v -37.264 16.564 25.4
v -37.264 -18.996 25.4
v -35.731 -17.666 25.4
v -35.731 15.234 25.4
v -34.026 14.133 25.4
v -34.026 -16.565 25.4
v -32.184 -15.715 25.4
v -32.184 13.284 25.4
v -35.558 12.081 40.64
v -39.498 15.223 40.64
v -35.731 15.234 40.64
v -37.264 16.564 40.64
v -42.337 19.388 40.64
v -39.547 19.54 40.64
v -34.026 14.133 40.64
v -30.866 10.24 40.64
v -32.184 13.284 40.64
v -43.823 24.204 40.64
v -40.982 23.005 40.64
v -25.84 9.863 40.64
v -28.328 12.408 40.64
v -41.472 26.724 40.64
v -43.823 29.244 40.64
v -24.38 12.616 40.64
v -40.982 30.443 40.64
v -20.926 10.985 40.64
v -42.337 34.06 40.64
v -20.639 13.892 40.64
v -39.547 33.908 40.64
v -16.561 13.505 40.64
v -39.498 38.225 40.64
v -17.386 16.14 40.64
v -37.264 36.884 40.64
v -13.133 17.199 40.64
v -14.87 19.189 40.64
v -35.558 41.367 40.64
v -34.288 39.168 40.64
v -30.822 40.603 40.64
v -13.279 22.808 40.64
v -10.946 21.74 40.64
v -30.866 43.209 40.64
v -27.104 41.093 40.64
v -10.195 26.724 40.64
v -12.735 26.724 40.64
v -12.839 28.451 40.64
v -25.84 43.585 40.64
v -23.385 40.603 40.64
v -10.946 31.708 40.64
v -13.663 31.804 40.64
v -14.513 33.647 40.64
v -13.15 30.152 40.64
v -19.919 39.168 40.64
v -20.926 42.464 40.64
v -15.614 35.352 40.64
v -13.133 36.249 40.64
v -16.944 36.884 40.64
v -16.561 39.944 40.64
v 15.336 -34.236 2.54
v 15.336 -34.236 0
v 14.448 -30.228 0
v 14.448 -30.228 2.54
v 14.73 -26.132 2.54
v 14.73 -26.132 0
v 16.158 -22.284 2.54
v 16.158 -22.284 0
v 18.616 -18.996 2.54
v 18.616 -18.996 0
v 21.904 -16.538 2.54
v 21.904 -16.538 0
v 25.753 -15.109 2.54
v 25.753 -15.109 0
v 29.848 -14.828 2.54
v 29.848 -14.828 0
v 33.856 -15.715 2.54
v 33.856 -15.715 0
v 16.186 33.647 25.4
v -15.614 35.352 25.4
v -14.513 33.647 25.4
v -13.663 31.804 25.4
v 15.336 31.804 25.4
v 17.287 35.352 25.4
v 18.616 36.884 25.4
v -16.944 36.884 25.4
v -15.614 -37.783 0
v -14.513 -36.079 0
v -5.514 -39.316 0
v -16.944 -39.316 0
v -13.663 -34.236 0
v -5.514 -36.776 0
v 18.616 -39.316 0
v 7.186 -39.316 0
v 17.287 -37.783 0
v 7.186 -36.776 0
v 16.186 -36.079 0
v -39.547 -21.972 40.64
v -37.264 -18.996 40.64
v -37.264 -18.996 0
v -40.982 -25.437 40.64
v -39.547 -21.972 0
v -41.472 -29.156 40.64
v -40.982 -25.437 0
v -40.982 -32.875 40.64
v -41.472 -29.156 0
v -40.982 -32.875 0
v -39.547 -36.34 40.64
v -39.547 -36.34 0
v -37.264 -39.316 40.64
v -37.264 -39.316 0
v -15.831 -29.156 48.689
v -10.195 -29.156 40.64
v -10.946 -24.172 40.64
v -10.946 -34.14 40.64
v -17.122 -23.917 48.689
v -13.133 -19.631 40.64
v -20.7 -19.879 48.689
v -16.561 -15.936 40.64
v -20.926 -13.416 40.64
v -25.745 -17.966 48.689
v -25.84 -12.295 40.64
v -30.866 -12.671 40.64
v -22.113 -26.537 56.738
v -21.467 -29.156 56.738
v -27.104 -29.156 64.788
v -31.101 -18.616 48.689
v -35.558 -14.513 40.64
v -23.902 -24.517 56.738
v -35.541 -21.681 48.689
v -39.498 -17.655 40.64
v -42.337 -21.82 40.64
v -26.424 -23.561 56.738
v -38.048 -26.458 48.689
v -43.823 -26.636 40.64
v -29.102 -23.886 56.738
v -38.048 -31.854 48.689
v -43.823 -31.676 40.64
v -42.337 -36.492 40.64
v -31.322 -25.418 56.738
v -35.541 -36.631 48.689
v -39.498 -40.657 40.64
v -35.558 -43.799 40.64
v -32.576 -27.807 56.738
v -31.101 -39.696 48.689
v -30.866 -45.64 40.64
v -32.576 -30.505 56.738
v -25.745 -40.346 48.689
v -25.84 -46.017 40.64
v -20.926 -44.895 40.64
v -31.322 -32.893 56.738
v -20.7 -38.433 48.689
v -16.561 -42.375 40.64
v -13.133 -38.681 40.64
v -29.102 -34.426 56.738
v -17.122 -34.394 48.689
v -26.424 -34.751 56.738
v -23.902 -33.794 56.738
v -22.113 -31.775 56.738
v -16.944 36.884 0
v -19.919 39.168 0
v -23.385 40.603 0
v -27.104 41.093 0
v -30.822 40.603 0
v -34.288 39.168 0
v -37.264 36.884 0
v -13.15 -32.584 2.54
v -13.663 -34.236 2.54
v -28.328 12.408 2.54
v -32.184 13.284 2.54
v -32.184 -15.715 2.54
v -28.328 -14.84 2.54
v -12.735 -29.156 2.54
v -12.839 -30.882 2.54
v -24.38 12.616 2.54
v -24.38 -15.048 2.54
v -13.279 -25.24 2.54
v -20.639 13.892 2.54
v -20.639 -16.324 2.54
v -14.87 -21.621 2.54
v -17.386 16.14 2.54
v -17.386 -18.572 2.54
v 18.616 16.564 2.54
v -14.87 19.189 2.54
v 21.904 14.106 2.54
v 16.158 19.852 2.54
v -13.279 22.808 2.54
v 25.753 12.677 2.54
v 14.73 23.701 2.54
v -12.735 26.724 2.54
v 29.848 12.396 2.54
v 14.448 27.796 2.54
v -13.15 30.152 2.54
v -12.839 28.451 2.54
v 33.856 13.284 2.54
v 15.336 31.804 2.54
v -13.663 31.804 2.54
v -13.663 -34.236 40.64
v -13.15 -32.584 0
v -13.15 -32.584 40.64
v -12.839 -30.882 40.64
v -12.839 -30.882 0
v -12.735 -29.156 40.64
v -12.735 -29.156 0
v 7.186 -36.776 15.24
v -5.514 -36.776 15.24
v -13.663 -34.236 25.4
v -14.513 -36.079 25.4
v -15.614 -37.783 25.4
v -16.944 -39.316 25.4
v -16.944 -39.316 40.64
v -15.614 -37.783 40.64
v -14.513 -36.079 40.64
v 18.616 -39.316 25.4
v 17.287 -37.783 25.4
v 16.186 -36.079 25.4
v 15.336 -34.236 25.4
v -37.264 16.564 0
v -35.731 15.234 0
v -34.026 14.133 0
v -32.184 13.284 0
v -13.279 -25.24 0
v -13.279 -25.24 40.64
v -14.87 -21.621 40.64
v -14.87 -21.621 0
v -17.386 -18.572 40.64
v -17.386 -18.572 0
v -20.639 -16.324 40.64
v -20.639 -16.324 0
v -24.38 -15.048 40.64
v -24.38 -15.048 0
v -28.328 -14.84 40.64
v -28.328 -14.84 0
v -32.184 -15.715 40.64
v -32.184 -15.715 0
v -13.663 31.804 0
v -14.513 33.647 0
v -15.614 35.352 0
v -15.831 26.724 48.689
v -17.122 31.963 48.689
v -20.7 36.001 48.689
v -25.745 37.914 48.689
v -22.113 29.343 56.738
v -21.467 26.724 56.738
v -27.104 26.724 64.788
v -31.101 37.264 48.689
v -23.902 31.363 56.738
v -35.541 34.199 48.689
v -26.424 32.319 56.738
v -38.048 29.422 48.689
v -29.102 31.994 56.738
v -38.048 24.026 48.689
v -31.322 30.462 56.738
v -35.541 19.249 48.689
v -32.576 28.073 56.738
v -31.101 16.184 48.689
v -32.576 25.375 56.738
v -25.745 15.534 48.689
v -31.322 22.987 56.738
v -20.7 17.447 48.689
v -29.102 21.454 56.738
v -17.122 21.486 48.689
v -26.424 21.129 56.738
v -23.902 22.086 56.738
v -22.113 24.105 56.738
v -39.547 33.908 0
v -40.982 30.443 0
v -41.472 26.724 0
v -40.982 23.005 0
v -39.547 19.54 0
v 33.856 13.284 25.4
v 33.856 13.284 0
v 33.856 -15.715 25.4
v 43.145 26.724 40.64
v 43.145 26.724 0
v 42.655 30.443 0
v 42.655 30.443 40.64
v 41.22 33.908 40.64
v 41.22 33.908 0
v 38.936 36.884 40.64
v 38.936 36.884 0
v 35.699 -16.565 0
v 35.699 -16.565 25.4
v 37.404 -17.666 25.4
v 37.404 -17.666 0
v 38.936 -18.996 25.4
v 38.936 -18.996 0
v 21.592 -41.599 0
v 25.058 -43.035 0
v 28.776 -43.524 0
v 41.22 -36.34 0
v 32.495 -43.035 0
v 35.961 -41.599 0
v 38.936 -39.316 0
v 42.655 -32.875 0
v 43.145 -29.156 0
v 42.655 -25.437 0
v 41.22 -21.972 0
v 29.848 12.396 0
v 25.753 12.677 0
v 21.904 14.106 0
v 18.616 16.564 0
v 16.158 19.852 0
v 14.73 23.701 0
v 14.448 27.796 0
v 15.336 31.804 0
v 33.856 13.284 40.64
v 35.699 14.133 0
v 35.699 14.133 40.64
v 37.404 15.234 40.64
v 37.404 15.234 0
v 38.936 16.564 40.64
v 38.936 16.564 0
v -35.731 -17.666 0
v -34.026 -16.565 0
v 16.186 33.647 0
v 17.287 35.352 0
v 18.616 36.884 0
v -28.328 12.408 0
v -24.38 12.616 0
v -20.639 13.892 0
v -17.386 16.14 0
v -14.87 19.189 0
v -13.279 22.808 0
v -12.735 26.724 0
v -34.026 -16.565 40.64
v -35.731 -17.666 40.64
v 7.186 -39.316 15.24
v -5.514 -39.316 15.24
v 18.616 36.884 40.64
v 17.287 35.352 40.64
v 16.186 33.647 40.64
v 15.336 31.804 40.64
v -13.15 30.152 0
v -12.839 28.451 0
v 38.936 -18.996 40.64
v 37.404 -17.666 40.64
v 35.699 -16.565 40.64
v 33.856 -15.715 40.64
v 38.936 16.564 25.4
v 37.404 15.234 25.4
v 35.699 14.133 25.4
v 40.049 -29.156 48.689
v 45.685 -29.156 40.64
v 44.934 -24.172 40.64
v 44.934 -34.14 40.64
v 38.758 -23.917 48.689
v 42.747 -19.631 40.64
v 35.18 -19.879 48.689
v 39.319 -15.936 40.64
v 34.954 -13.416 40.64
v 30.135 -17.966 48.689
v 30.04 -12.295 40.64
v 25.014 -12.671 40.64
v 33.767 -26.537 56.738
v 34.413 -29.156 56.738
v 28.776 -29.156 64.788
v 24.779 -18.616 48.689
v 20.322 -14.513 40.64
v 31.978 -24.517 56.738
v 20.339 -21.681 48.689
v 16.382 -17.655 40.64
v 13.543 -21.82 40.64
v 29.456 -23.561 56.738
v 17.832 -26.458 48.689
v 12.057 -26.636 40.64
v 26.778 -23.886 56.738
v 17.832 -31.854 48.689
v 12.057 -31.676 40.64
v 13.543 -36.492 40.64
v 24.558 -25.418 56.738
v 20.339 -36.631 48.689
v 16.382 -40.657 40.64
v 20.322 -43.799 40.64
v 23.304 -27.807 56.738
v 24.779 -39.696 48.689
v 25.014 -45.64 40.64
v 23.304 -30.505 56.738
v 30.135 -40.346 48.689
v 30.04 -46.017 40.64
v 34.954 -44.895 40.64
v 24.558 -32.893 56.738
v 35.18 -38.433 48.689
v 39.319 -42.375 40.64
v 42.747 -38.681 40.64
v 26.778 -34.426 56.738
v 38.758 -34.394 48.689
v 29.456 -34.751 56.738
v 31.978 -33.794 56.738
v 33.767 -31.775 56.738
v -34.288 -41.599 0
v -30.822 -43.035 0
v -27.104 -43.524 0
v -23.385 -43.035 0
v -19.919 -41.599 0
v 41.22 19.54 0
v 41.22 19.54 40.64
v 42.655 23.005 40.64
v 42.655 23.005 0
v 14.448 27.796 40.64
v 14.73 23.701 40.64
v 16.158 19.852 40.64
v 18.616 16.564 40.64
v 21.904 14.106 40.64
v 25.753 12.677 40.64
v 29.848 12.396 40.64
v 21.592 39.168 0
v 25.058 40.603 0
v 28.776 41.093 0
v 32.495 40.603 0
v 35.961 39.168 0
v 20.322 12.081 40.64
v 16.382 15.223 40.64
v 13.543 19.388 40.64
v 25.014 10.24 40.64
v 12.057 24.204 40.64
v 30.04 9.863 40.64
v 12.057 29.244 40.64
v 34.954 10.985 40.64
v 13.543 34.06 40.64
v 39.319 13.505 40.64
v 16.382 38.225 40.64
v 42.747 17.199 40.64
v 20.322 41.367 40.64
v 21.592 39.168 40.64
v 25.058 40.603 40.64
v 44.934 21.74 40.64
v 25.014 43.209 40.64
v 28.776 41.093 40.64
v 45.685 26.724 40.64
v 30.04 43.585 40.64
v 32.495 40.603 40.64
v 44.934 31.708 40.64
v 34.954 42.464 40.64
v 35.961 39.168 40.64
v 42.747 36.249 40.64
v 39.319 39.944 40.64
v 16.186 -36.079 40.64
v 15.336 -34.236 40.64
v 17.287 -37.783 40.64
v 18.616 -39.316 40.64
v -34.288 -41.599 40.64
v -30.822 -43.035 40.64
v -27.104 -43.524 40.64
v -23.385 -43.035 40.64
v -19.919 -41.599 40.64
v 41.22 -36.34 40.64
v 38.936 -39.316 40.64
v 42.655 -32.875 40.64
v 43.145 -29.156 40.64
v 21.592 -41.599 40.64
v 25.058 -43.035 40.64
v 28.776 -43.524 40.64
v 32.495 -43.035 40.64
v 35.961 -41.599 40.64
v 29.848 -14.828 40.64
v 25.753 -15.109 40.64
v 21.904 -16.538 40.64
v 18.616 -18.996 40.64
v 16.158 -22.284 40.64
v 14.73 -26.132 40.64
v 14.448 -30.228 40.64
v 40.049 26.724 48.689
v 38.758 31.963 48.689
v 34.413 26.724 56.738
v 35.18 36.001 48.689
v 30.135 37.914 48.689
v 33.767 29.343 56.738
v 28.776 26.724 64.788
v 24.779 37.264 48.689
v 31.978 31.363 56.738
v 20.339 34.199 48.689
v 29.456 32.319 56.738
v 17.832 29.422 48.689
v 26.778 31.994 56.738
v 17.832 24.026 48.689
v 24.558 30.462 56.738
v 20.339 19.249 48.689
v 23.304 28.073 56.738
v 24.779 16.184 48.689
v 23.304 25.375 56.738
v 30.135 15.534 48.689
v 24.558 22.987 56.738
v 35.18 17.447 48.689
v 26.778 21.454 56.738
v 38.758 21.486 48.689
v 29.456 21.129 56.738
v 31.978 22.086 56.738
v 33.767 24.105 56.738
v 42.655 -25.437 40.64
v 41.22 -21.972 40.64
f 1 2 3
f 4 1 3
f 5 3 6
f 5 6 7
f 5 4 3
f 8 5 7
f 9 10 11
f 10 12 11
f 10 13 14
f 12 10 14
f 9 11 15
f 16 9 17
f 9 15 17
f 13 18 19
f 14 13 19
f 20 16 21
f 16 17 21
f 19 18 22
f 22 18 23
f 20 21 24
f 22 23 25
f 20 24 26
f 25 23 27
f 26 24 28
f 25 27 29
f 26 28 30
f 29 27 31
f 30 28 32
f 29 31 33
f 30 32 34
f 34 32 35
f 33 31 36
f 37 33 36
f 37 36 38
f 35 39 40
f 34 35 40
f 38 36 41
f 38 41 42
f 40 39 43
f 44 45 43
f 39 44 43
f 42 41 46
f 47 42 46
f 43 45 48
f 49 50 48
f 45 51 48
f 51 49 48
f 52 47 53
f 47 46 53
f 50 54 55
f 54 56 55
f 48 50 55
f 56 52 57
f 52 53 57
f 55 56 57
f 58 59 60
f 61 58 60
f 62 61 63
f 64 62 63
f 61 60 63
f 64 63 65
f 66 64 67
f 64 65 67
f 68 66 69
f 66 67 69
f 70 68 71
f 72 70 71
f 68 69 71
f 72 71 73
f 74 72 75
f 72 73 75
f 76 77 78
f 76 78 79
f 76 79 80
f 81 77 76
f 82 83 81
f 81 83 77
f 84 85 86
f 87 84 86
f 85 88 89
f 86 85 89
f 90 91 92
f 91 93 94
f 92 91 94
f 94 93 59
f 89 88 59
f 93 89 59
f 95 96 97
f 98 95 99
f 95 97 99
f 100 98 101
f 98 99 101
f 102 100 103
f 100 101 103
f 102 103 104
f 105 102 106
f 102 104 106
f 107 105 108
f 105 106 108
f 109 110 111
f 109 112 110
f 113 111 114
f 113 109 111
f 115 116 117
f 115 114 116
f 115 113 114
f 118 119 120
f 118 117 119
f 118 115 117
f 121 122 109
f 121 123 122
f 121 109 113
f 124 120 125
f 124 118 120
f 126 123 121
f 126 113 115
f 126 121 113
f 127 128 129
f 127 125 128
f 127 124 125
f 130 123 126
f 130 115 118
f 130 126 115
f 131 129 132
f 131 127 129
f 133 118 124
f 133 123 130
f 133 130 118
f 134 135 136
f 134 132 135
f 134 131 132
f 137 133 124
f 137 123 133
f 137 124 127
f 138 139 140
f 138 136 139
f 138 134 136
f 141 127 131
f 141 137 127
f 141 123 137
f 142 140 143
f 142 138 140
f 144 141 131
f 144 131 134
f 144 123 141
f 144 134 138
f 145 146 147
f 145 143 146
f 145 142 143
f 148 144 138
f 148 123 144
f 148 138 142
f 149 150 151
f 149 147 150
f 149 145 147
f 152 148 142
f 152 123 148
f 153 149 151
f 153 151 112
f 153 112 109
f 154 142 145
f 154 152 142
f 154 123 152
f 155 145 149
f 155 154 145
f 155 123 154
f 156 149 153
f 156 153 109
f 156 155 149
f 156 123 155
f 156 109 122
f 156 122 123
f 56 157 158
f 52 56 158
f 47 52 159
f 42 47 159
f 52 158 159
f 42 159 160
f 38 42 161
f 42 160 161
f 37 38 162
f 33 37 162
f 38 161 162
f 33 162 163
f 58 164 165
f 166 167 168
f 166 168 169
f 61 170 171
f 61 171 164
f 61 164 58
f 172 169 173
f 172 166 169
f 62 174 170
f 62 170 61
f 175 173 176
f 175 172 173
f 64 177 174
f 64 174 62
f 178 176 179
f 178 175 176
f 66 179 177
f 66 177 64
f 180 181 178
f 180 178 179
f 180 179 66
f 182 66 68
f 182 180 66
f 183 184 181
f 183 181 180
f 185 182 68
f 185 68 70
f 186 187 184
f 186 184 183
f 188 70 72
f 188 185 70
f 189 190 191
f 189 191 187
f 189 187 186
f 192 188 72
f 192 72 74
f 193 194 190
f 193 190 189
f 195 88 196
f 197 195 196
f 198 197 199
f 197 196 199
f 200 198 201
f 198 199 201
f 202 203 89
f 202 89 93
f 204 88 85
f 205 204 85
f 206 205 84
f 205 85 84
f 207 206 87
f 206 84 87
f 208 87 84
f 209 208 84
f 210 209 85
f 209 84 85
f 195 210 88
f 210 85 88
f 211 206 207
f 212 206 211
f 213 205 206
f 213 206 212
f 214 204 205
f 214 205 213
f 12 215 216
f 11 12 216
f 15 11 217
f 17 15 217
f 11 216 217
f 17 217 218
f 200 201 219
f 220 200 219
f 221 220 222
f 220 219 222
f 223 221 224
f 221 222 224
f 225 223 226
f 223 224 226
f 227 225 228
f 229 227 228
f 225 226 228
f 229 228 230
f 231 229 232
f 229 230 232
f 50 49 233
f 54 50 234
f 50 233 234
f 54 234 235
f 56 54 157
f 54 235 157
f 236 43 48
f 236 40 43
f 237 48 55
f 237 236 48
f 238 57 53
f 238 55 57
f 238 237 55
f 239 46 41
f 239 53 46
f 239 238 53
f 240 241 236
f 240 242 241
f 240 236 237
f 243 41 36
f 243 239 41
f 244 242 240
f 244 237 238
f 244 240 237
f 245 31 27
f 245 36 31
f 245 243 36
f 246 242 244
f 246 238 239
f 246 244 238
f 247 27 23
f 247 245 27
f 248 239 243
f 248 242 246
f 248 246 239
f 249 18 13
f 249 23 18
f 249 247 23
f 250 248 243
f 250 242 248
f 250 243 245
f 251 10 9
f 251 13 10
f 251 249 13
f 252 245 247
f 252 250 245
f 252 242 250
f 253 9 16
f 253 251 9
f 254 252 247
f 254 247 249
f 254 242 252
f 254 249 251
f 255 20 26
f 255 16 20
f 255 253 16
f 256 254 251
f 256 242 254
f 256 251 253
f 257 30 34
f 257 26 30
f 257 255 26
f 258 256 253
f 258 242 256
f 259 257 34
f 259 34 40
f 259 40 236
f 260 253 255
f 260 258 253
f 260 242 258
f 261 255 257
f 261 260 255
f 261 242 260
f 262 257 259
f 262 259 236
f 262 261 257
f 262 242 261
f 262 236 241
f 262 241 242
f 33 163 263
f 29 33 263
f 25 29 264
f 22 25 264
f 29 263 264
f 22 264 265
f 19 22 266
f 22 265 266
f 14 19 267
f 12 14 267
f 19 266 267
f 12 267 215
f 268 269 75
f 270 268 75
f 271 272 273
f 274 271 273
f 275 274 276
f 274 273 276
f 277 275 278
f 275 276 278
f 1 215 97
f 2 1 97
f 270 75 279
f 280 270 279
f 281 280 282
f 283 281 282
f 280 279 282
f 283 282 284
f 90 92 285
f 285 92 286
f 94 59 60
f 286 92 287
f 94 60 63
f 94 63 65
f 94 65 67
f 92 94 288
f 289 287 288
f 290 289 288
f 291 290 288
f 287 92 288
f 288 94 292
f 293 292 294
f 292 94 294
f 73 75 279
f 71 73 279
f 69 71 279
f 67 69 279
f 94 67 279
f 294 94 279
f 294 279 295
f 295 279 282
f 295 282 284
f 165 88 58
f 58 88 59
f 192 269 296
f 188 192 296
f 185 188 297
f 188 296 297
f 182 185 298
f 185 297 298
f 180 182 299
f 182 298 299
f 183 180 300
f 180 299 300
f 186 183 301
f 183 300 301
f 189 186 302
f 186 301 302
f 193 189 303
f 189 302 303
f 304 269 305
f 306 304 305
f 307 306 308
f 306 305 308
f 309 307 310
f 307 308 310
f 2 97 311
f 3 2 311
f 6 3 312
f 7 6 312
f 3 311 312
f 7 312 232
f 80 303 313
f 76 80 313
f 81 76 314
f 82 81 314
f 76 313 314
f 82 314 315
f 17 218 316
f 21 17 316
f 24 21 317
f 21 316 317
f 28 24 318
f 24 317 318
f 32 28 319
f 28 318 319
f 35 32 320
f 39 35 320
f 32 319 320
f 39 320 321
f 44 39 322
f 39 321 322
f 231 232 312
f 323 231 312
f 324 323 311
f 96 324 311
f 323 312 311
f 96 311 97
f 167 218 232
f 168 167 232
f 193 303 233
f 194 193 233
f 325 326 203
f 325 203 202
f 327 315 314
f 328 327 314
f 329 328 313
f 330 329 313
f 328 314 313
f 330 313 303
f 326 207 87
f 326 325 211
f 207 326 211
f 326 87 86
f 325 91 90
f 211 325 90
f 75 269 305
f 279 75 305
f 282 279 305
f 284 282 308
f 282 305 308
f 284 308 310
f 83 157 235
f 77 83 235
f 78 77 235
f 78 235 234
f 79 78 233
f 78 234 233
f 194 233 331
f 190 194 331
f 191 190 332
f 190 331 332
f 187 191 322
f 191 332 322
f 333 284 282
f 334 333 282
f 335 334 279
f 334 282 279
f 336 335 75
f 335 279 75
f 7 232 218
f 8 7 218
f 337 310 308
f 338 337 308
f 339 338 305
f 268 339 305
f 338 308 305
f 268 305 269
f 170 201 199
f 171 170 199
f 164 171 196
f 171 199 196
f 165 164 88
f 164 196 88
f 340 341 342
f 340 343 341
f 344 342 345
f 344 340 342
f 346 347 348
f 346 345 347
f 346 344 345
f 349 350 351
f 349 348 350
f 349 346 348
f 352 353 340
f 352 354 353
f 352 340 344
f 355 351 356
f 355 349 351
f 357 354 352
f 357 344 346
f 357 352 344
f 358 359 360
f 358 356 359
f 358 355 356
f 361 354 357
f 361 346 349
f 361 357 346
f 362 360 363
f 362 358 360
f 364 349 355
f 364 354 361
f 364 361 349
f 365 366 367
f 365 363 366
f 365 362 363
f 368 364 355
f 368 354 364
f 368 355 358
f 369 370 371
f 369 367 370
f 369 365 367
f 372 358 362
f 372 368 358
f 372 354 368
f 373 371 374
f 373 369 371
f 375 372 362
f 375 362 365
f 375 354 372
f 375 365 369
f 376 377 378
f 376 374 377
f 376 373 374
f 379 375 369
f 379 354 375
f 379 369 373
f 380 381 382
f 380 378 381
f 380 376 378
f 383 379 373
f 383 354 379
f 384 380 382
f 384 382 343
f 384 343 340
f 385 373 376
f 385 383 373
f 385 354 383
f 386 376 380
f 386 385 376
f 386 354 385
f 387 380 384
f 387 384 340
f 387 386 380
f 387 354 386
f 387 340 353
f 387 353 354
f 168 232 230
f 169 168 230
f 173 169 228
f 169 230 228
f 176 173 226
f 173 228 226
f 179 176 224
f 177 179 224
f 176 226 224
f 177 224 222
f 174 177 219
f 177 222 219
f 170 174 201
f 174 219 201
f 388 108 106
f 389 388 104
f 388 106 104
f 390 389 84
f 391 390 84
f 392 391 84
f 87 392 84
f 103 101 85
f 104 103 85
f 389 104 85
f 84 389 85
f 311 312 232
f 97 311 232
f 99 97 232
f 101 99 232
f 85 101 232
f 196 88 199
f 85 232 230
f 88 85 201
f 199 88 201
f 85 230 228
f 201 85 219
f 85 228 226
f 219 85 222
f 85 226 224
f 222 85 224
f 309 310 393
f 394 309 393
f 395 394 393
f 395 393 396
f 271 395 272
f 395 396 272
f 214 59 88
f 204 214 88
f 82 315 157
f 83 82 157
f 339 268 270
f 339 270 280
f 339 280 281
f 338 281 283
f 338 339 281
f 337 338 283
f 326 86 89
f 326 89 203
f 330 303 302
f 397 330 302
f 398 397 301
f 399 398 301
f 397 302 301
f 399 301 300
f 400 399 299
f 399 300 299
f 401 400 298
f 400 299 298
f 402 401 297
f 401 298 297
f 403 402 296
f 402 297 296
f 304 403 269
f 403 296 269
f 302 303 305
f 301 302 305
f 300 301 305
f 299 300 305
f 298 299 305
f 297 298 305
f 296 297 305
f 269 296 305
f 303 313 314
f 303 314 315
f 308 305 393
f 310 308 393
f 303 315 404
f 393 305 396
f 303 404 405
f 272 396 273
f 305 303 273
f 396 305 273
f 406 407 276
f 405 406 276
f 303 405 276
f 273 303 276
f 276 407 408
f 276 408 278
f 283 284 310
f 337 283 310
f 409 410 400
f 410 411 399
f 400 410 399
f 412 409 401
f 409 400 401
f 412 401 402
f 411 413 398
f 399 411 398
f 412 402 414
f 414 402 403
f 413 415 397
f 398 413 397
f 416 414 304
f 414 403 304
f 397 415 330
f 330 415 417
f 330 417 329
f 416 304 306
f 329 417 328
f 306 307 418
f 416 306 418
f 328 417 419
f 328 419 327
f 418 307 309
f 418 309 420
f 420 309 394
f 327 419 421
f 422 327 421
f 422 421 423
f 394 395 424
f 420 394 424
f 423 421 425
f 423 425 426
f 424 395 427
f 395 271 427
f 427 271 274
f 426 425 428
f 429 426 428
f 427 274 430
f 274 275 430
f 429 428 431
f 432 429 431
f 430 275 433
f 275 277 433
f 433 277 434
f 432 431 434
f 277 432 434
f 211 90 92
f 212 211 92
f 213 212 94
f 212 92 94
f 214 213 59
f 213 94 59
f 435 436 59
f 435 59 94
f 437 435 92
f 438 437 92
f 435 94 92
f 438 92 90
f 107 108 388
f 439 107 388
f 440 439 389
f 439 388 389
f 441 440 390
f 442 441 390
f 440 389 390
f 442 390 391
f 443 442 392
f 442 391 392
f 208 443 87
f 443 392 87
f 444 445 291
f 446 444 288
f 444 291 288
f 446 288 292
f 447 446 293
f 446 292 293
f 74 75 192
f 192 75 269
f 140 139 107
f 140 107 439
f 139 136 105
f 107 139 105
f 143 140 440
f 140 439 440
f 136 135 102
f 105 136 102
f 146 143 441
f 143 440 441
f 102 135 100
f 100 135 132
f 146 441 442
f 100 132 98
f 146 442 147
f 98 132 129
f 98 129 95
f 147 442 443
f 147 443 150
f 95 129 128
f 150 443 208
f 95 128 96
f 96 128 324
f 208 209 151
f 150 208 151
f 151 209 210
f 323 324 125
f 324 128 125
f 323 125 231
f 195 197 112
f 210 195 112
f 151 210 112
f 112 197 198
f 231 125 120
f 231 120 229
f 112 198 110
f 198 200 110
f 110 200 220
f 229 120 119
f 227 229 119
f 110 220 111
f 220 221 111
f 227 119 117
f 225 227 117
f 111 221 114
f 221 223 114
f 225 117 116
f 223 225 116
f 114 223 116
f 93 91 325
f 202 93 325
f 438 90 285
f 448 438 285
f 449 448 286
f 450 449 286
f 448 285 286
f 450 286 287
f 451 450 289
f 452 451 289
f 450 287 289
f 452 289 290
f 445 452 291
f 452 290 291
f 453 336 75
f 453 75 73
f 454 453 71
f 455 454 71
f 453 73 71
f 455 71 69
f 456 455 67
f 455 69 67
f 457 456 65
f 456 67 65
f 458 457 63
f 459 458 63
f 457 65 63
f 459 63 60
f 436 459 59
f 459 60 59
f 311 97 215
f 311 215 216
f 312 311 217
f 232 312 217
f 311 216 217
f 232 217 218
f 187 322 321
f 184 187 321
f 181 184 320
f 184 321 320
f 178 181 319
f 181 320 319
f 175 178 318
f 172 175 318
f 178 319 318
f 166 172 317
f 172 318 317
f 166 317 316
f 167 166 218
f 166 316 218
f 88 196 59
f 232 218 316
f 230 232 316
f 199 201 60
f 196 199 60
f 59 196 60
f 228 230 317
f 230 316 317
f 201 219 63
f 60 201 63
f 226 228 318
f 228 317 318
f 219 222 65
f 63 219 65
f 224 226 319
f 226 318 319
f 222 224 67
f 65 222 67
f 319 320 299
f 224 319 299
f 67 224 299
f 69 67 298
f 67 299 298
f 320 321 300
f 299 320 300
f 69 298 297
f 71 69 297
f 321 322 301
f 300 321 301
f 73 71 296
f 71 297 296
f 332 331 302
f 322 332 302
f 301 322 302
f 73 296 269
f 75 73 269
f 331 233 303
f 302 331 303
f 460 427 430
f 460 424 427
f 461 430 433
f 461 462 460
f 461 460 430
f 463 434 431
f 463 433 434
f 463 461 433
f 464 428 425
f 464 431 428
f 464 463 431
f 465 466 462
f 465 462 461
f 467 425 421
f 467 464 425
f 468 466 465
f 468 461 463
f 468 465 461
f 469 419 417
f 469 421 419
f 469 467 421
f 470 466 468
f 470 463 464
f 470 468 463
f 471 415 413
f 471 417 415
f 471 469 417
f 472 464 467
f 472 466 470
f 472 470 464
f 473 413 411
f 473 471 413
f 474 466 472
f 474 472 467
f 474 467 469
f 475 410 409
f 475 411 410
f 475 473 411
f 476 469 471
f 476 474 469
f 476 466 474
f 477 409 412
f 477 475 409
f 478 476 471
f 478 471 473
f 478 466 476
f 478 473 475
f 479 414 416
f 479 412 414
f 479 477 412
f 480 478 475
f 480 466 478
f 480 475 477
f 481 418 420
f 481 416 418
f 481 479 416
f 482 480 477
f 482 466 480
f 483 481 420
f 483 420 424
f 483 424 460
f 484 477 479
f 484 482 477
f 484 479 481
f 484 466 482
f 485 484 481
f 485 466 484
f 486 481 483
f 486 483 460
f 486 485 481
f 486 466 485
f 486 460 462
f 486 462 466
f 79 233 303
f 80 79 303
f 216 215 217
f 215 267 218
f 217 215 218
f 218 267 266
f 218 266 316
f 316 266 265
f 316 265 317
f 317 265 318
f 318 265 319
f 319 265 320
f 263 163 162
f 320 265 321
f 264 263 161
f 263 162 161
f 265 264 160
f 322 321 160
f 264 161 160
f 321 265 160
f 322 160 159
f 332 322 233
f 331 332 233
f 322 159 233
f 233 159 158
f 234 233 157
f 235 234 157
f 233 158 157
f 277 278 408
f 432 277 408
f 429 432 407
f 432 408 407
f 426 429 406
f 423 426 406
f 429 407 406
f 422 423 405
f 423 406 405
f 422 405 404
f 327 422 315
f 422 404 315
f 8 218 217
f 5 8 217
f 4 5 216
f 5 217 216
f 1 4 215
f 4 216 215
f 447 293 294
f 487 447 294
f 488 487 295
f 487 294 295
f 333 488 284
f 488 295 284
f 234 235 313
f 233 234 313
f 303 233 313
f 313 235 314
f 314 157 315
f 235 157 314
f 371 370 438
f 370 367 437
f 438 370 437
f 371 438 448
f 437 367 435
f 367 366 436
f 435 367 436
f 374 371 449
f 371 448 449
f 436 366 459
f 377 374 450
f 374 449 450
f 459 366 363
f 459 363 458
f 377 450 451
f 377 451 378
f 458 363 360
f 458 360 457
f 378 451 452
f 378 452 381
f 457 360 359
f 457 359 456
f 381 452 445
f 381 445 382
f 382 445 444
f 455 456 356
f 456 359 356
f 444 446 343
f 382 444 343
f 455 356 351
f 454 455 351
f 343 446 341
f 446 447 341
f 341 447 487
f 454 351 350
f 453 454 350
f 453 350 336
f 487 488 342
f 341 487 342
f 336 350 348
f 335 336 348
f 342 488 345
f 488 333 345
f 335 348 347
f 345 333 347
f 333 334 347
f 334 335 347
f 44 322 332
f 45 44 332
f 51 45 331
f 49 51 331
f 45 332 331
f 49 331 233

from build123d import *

# Parameters (mm, degrees)
F1_DEPTH  = 2.54
F2_DEPTH  = 25.4
F3_DEPTH  = 40.64
F4_R      = 16.9084097937
F5_DEPTH  = 25.4
F5_TAPER  = 35
F6_R      = 16.9084097937
F7_DEPTH  = 25.4
F7_TAPER  = 35
F8_R      = 16.9084097937
F9_DEPTH  = 25.4
F9_TAPER  = 35
F10_R     = 16.9084097937
F11_DEPTH = 25.4
F11_TAPER = 35
F12_W     = 12.7
F12_H     = 15.24
F13_DEPTH = 2.54


with BuildPart() as f1:
    # F0 (on Top) → F1 (new body)
    with BuildSketch(Plane.XY):
        with BuildLine():
            Line((15.3360397668, 31.8040953928), (-13.6631269128, 31.8040953928))
            ThreePointArc((-13.6631269128, 31.8040953928), (-12.969035899, 29.3061280832), (-12.7351337793, 26.7240953928))
            ThreePointArc((-12.7351337793, 26.7240953928), (-18.9347101726, 14.9037163432), (-32.183543573, 13.2836787326))
            Line((-32.183543573, 13.2836787326), (-32.183543573, -15.715487947))
            ThreePointArc((-32.183543573, -15.715487947), (-18.9347101726, -17.3355255576), (-12.7351337793, -29.1559046072))
            ThreePointArc((-12.7351337793, -29.1559046072), (-12.969035899, -31.7379372975), (-13.6631269128, -34.2359046072))
            Line((-13.6631269128, -34.2359046072), (15.3360397668, -34.2359046072))
            ThreePointArc((15.3360397668, -34.2359046072), (18.616456427, -18.9959046072), (33.856456427, -15.715487947))
            Line((33.856456427, -15.715487947), (33.856456427, 13.2836787326))
            ThreePointArc((33.856456427, 13.2836787326), (18.616456427, 16.5640953928), (15.3360397668, 31.8040953928))
        make_face()
    extrude(amount=F1_DEPTH)


with BuildPart() as f2:
    # F0 (on Top) → F2 (new body)
    with BuildSketch(Plane.XY):
        with BuildLine():
            Line((38.936456427, -18.9959046072), (38.936456427, 16.5640953928))
            ThreePointArc((38.936456427, 16.5640953928), (36.5709854933, 14.6536141831), (33.856456427, 13.2836787326))
            Line((33.856456427, 13.2836787326), (33.856456427, -15.715487947))
            ThreePointArc((33.856456427, -15.715487947), (36.5709854933, -17.0854233975), (38.936456427, -18.9959046072))
        make_face()
    extrude(amount=F2_DEPTH)


with BuildPart() as f2b:
    # F0 (on Top) → F2, piece 2 (new body)
    with BuildSketch(Plane.XY):
        with BuildLine():
            ThreePointArc((-13.6631269128, -34.2359046072), (-15.0330623633, -36.9504336735), (-16.943543573, -39.3159046072))
            Line((-16.943543573, -39.3159046072), (18.616456427, -39.3159046072))
            ThreePointArc((18.616456427, -39.3159046072), (16.7059752173, -36.9504336735), (15.3360397668, -34.2359046072))
            Line((15.3360397668, -34.2359046072), (-13.6631269128, -34.2359046072))
        make_face()
    extrude(amount=F2_DEPTH)

    # F12 (on face) → F13 (cut)
    with BuildSketch(Plane.XZ.offset(39.3159046072)):
        with Locations((0.836456427, 7.62)):
            Rectangle(F12_W, F12_H)
    extrude(amount=-F13_DEPTH, mode=Mode.SUBTRACT)


with BuildPart() as f2c:
    # F0 (on Top) → F2, piece 3 (new body)
    with BuildSketch(Plane.XY):
        with BuildLine():
            ThreePointArc((-32.183543573, 13.2836787326), (-34.8980726394, 14.6536141831), (-37.263543573, 16.5640953928))
            Line((-37.263543573, 16.5640953928), (-37.263543573, -18.9959046072))
            ThreePointArc((-37.263543573, -18.9959046072), (-34.8980726394, -17.0854233975), (-32.183543573, -15.715487947))
            Line((-32.183543573, -15.715487947), (-32.183543573, 13.2836787326))
        make_face()
    extrude(amount=F2_DEPTH)


with BuildPart() as f2d:
    # F0 (on Top) → F2, piece 4 (new body)
    with BuildSketch(Plane.XY):
        with BuildLine():
            Line((18.616456427, 36.8840953928), (-16.943543573, 36.8840953928))
            ThreePointArc((-16.943543573, 36.8840953928), (-15.0330623633, 34.5186244592), (-13.6631269128, 31.8040953928))
            Line((-13.6631269128, 31.8040953928), (15.3360397668, 31.8040953928))
            ThreePointArc((15.3360397668, 31.8040953928), (16.7059752173, 34.5186244592), (18.616456427, 36.8840953928))
        make_face()
    extrude(amount=F2_DEPTH)


with BuildPart() as f3:
    # F0 (on Top) → F3 (new body)
    with BuildSketch(Plane.XY):
        with BuildLine():
            ThreePointArc((43.1448662207, 26.7240953928), (42.0511361501, 32.2226477703), (38.936456427, 36.8840953928))
            Line((38.936456427, 36.8840953928), (38.936456427, 16.5640953928))
            ThreePointArc((38.936456427, 16.5640953928), (42.0511361501, 21.2255430153), (43.1448662207, 26.7240953928))
        make_face()
        with BuildLine():
            Line((38.936456427, 36.8840953928), (18.616456427, 36.8840953928))
            ThreePointArc((18.616456427, 36.8840953928), (16.7059752173, 34.5186244592), (15.3360397668, 31.8040953928))
            ThreePointArc((15.3360397668, 31.8040953928), (18.616456427, 16.5640953928), (33.856456427, 13.2836787326))
            ThreePointArc((33.856456427, 13.2836787326), (36.5709854933, 14.6536141831), (38.936456427, 16.5640953928))
            Line((38.936456427, 16.5640953928), (38.936456427, 36.8840953928))
        make_face()
        with BuildLine():
            ThreePointArc((38.936456427, 36.8840953928), (28.776456427, 41.0925051865), (18.616456427, 36.8840953928))
            Line((18.616456427, 36.8840953928), (38.936456427, 36.8840953928))
        make_face()
    extrude(amount=F3_DEPTH)

    # F8 (on face) → F9 (join)
    with BuildSketch(Plane.XY.offset(40.64)):
        with Locations((28.776456427, 26.7240953928)):
            Circle(F8_R)
    extrude(amount=F9_DEPTH, taper=F9_TAPER)


with BuildPart() as f3b:
    # F0 (on Top) → F3, piece 2 (new body)
    with BuildSketch(Plane.XY):
        with BuildLine():
            ThreePointArc((43.1448662207, -29.1559046072), (42.0511361501, -23.6573522297), (38.936456427, -18.9959046072))
            Line((38.936456427, -18.9959046072), (38.936456427, -39.3159046072))
            ThreePointArc((38.936456427, -39.3159046072), (42.0511361501, -34.6544569847), (43.1448662207, -29.1559046072))
        make_face()
        with BuildLine():
            Line((38.936456427, -39.3159046072), (18.616456427, -39.3159046072))
            ThreePointArc((18.616456427, -39.3159046072), (28.776456427, -43.5243144009), (38.936456427, -39.3159046072))
        make_face()
        with BuildLine():
            Line((38.936456427, -39.3159046072), (38.936456427, -18.9959046072))
            ThreePointArc((38.936456427, -18.9959046072), (36.5709854933, -17.0854233975), (33.856456427, -15.715487947))
            ThreePointArc((33.856456427, -15.715487947), (18.616456427, -18.9959046072), (15.3360397668, -34.2359046072))
            ThreePointArc((15.3360397668, -34.2359046072), (16.7059752173, -36.9504336735), (18.616456427, -39.3159046072))
            Line((18.616456427, -39.3159046072), (38.936456427, -39.3159046072))
        make_face()
    extrude(amount=F3_DEPTH)

    # F10 (on face) → F11 (join)
    with BuildSketch(Plane.XY.offset(40.64)):
        with Locations((28.776456427, -29.1559046072)):
            Circle(F10_R)
    extrude(amount=F11_DEPTH, taper=F11_TAPER)


with BuildPart() as f3c:
    # F0 (on Top) → F3, piece 3 (new body)
    with BuildSketch(Plane.XY):
        with BuildLine():
            Line((-16.943543573, -39.3159046072), (-37.263543573, -39.3159046072))
            ThreePointArc((-37.263543573, -39.3159046072), (-27.103543573, -43.5243144009), (-16.943543573, -39.3159046072))
        make_face()
        with BuildLine():
            ThreePointArc((-32.183543573, -15.715487947), (-34.8980726394, -17.0854233975), (-37.263543573, -18.9959046072))
            Line((-37.263543573, -18.9959046072), (-37.263543573, -39.3159046072))
            Line((-37.263543573, -39.3159046072), (-16.943543573, -39.3159046072))
            ThreePointArc((-16.943543573, -39.3159046072), (-15.0330623633, -36.9504336735), (-13.6631269128, -34.2359046072))
            ThreePointArc((-13.6631269128, -34.2359046072), (-12.969035899, -31.7379372975), (-12.7351337793, -29.1559046072))
            ThreePointArc((-12.7351337793, -29.1559046072), (-18.9347101726, -17.3355255576), (-32.183543573, -15.715487947))
        make_face()
        with BuildLine():
            Line((-37.263543573, -39.3159046072), (-37.263543573, -18.9959046072))
            ThreePointArc((-37.263543573, -18.9959046072), (-41.4719533667, -29.1559046072), (-37.263543573, -39.3159046072))
        make_face()
    extrude(amount=F3_DEPTH)

    # F4 (on face) → F5 (join)
    with BuildSketch(Plane.XY.offset(40.64)):
        with Locations((-27.103543573, -29.1559046072)):
            Circle(F4_R)
    extrude(amount=F5_DEPTH, taper=F5_TAPER)


with BuildPart() as f3d:
    # F0 (on Top) → F3, piece 4 (new body)
    with BuildSketch(Plane.XY):
        with BuildLine():
            Line((-37.263543573, 16.5640953928), (-37.263543573, 36.8840953928))
            ThreePointArc((-37.263543573, 36.8840953928), (-41.4719533667, 26.7240953928), (-37.263543573, 16.5640953928))
        make_face()
        with BuildLine():
            Line((-16.943543573, 36.8840953928), (-37.263543573, 36.8840953928))
            Line((-37.263543573, 36.8840953928), (-37.263543573, 16.5640953928))
            ThreePointArc((-37.263543573, 16.5640953928), (-34.8980726394, 14.6536141831), (-32.183543573, 13.2836787326))
            ThreePointArc((-32.183543573, 13.2836787326), (-18.9347101726, 14.9037163432), (-12.7351337793, 26.7240953928))
            ThreePointArc((-12.7351337793, 26.7240953928), (-12.969035899, 29.3061280832), (-13.6631269128, 31.8040953928))
            ThreePointArc((-13.6631269128, 31.8040953928), (-15.0330623633, 34.5186244592), (-16.943543573, 36.8840953928))
        make_face()
        with BuildLine():
            ThreePointArc((-16.943543573, 36.8840953928), (-27.103543573, 41.0925051865), (-37.263543573, 36.8840953928))
            Line((-37.263543573, 36.8840953928), (-16.943543573, 36.8840953928))
        make_face()
    extrude(amount=F3_DEPTH)

    # F6 (on face) → F7 (join)
    with BuildSketch(Plane.XY.offset(40.64)):
        with Locations((-27.103543573, 26.7240953928)):
            Circle(F6_R)
    extrude(amount=F7_DEPTH, taper=F7_TAPER)


solid = Compound([f1.part, f2.part, f2b.part, f2c.part, f2d.part, f3.part, f3b.part, f3c.part, f3d.part])
